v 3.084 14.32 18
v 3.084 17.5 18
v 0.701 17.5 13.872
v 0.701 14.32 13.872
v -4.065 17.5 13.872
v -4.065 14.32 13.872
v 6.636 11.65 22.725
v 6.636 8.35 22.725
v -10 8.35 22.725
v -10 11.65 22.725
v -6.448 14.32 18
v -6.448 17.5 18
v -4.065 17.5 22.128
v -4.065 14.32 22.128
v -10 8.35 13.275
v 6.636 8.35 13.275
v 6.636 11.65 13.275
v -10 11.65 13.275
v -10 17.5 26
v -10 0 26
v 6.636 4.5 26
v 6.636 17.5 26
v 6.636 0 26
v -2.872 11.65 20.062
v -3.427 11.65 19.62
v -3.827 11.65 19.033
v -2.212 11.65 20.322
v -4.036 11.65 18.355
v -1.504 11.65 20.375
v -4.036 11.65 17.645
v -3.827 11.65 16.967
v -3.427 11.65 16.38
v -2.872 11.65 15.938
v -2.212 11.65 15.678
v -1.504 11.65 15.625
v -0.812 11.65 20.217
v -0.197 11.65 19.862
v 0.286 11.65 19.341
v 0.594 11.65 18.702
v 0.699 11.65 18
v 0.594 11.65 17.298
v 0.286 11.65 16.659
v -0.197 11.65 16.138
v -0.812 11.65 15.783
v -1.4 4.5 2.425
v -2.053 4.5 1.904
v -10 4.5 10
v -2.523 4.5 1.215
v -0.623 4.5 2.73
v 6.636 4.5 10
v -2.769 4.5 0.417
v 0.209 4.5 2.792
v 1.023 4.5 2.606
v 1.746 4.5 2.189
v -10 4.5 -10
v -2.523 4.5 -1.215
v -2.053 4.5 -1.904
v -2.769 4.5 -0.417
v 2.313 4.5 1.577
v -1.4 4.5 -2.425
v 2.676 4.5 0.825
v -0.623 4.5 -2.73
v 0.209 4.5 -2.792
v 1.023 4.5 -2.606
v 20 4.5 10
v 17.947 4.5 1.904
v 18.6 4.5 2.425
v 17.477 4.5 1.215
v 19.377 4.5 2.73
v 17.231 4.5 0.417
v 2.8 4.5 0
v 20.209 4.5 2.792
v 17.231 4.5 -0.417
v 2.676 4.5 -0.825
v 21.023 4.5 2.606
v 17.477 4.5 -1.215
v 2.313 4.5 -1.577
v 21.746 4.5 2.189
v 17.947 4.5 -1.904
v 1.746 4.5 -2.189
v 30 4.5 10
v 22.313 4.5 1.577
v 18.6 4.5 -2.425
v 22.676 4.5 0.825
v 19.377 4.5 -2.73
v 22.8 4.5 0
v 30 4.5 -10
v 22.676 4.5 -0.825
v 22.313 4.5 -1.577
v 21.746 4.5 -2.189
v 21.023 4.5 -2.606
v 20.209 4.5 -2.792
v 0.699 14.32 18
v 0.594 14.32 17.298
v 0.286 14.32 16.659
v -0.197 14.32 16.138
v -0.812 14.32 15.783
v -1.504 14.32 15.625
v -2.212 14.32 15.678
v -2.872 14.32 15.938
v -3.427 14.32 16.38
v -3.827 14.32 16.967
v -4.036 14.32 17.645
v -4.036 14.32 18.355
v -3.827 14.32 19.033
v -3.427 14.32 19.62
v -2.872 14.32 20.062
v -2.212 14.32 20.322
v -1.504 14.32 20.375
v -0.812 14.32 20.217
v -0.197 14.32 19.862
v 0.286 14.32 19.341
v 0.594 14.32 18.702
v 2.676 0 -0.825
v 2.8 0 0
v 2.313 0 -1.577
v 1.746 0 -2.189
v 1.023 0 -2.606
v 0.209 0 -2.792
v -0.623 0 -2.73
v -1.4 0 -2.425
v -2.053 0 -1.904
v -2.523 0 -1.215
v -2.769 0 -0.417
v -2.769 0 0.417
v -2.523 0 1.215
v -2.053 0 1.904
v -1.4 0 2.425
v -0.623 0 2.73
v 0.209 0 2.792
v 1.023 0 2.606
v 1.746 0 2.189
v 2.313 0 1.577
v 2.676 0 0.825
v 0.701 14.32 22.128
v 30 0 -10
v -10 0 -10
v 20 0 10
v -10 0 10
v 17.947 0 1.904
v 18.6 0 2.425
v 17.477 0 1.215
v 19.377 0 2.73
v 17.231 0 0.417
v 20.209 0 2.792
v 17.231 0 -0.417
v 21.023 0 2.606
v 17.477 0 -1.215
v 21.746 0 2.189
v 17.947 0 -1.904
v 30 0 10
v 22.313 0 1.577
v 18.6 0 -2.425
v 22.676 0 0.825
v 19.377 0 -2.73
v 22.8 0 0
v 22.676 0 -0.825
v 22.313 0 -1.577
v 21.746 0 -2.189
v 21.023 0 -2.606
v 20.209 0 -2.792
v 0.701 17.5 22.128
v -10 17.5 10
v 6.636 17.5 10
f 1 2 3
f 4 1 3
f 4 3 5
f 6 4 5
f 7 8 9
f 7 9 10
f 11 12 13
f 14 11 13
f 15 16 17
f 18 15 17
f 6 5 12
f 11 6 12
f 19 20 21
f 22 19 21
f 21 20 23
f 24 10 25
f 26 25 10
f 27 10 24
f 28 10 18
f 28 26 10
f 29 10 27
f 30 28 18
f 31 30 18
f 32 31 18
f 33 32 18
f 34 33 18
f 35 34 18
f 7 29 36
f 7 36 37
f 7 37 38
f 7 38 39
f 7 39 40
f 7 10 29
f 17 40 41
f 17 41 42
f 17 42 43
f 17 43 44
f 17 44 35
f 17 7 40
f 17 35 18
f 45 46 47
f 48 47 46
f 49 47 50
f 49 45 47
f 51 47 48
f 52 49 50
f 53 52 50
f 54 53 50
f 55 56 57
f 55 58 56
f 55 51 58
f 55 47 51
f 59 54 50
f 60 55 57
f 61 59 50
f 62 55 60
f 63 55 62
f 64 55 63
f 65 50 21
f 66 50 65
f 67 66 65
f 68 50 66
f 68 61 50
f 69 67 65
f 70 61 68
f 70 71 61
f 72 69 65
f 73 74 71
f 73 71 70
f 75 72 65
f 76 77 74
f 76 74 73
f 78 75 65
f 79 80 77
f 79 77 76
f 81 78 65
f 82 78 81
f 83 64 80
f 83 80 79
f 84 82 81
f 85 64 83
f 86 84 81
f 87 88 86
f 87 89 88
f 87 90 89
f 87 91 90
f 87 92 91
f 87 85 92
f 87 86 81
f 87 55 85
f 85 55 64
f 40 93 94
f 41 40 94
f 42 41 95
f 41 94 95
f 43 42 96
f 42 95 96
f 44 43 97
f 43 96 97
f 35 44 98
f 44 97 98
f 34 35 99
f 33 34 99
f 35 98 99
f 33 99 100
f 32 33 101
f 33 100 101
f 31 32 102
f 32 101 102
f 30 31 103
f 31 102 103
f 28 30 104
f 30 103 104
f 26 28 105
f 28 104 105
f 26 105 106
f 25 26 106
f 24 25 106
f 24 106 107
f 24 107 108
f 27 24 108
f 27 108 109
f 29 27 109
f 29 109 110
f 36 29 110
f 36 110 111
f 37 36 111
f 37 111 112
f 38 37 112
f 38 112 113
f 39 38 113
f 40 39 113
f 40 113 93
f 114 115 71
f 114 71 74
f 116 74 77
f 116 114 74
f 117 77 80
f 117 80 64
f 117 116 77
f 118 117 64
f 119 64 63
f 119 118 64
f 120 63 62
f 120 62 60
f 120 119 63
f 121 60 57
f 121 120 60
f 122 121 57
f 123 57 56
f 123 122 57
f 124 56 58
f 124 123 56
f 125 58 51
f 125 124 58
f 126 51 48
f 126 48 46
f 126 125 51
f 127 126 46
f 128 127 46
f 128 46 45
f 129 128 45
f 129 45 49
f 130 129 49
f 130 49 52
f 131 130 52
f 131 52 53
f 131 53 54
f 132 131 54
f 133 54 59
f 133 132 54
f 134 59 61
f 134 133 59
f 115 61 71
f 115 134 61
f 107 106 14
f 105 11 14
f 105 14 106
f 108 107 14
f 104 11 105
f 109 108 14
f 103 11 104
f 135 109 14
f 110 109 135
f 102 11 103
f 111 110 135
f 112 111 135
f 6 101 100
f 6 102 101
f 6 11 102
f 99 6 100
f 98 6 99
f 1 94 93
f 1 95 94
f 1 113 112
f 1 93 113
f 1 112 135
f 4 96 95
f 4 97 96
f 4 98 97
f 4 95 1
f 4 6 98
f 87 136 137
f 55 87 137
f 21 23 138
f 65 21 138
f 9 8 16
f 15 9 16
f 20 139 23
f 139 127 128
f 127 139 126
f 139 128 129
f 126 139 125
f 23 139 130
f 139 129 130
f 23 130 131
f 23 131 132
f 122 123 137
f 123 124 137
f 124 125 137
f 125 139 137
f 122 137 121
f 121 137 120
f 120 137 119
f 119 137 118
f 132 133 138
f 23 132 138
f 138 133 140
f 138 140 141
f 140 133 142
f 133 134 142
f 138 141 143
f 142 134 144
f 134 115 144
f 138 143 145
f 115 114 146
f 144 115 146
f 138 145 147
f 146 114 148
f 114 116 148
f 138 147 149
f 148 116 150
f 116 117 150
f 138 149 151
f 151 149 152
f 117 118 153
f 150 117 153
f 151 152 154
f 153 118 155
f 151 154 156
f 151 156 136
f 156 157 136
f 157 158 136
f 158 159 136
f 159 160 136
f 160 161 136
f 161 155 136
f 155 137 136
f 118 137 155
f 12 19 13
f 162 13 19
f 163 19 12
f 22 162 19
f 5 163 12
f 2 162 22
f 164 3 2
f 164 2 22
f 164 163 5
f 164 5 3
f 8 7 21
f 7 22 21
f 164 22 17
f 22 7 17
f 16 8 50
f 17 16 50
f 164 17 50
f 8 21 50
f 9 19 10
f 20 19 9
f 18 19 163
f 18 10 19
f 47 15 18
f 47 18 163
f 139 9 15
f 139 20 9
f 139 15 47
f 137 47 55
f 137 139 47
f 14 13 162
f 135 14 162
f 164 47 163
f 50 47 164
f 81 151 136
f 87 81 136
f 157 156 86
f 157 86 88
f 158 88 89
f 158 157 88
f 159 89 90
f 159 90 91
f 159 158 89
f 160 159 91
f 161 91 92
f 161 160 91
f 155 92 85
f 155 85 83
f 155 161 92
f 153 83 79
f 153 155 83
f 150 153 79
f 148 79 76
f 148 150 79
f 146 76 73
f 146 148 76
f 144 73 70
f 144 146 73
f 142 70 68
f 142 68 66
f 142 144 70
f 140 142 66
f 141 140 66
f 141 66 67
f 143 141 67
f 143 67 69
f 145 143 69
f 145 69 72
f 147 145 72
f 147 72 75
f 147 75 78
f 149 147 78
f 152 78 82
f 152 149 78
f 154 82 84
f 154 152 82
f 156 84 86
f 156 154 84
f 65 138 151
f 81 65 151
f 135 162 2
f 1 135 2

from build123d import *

# Parameters (mm, degrees)
SKETCH1_R           = 2.8
BOSS_EXTRUDE1_DEPTH = 4.5
SKETCH1_3_W         = 16.636354437
SKETCH1_3_H         = 16
BOSS_EXTRUDE2_DEPTH = 17.5
SKETCH2_W           = 9.45
SKETCH2_H           = 3.3
CUT_EXTRUDE1_DEPTH  = 40.091046724
CUT_EXTRUDE2_DEPTH  = 3.18
CUT_EXTRUDE3_REACH  = 45.385
SKETCH5_3_R         = 2.38125


with BuildPart() as part:
    # Sketch1 → Boss-Extrude1 (new body)
    with BuildSketch(Plane(origin=(0, 0, 0), x_dir=(1, 0, 0), z_dir=(0, 1, 0))):
        Polygon((30, 10), (-10, 10), (-10, -10), (6.636354437, -10), (6.636354437, -26), (20, -10), (30, -10), align=None)
        Circle(SKETCH1_R, mode=Mode.SUBTRACT)
        with Locations((20, 0)):
            Circle(SKETCH1_R, mode=Mode.SUBTRACT)
    extrude(amount=BOSS_EXTRUDE1_DEPTH)

    # Sketch1<3> → Boss-Extrude2 (add)
    with BuildSketch(Plane(origin=(0, 0, 0), x_dir=(1, 0, 0), z_dir=(0, 1, 0))):
        with Locations((-1.681822781, -18)):
            Rectangle(SKETCH1_3_W, SKETCH1_3_H)
    extrude(amount=BOSS_EXTRUDE2_DEPTH)

    # Sketch2 → Cut-Extrude1 (cut, through all)
    with BuildSketch(Plane(origin=(6.636354437, 0, 0), x_dir=(0, 0, -1), z_dir=(1, 0, 0))):
        with Locations((-18, 10)):
            Rectangle(SKETCH2_W, SKETCH2_H)
    extrude(amount=-CUT_EXTRUDE1_DEPTH, mode=Mode.SUBTRACT)

    # Sketch5 → Cut-Extrude2 (cut)
    with BuildSketch(Plane(origin=(0, 17.5, 0), x_dir=(1, 0, 0), z_dir=(0, 1, 0))):
        Polygon((0.701190454, -13.8725), (-4.064836018, -13.8725), (-6.447849254, -18), (-4.064836018, -22.1275), (0.701190454, -22.1275), (3.08420369, -18), align=None)
    extrude(amount=-CUT_EXTRUDE2_DEPTH, mode=Mode.SUBTRACT)

    # Sketch5<3> → Cut-Extrude3 (cut, up to next)
    with BuildSketch(Plane(origin=(0, 17.5, 0), x_dir=(1, 0, 0), z_dir=(0, 1, 0)), mode=Mode.PRIVATE) as cut_extrude3_sk1:
        with Locations((-1.681822782, -18)):
            Circle(SKETCH5_3_R)
    cut_extrude3_tool1 = extrude(cut_extrude3_sk1.sketch, amount=-CUT_EXTRUDE3_REACH, mode=Mode.PRIVATE) & part.part
    add(cut_extrude3_tool1.solids().sort_by_distance((-1.681823, 17.5, 18))[0], mode=Mode.SUBTRACT)


solid = part.part
